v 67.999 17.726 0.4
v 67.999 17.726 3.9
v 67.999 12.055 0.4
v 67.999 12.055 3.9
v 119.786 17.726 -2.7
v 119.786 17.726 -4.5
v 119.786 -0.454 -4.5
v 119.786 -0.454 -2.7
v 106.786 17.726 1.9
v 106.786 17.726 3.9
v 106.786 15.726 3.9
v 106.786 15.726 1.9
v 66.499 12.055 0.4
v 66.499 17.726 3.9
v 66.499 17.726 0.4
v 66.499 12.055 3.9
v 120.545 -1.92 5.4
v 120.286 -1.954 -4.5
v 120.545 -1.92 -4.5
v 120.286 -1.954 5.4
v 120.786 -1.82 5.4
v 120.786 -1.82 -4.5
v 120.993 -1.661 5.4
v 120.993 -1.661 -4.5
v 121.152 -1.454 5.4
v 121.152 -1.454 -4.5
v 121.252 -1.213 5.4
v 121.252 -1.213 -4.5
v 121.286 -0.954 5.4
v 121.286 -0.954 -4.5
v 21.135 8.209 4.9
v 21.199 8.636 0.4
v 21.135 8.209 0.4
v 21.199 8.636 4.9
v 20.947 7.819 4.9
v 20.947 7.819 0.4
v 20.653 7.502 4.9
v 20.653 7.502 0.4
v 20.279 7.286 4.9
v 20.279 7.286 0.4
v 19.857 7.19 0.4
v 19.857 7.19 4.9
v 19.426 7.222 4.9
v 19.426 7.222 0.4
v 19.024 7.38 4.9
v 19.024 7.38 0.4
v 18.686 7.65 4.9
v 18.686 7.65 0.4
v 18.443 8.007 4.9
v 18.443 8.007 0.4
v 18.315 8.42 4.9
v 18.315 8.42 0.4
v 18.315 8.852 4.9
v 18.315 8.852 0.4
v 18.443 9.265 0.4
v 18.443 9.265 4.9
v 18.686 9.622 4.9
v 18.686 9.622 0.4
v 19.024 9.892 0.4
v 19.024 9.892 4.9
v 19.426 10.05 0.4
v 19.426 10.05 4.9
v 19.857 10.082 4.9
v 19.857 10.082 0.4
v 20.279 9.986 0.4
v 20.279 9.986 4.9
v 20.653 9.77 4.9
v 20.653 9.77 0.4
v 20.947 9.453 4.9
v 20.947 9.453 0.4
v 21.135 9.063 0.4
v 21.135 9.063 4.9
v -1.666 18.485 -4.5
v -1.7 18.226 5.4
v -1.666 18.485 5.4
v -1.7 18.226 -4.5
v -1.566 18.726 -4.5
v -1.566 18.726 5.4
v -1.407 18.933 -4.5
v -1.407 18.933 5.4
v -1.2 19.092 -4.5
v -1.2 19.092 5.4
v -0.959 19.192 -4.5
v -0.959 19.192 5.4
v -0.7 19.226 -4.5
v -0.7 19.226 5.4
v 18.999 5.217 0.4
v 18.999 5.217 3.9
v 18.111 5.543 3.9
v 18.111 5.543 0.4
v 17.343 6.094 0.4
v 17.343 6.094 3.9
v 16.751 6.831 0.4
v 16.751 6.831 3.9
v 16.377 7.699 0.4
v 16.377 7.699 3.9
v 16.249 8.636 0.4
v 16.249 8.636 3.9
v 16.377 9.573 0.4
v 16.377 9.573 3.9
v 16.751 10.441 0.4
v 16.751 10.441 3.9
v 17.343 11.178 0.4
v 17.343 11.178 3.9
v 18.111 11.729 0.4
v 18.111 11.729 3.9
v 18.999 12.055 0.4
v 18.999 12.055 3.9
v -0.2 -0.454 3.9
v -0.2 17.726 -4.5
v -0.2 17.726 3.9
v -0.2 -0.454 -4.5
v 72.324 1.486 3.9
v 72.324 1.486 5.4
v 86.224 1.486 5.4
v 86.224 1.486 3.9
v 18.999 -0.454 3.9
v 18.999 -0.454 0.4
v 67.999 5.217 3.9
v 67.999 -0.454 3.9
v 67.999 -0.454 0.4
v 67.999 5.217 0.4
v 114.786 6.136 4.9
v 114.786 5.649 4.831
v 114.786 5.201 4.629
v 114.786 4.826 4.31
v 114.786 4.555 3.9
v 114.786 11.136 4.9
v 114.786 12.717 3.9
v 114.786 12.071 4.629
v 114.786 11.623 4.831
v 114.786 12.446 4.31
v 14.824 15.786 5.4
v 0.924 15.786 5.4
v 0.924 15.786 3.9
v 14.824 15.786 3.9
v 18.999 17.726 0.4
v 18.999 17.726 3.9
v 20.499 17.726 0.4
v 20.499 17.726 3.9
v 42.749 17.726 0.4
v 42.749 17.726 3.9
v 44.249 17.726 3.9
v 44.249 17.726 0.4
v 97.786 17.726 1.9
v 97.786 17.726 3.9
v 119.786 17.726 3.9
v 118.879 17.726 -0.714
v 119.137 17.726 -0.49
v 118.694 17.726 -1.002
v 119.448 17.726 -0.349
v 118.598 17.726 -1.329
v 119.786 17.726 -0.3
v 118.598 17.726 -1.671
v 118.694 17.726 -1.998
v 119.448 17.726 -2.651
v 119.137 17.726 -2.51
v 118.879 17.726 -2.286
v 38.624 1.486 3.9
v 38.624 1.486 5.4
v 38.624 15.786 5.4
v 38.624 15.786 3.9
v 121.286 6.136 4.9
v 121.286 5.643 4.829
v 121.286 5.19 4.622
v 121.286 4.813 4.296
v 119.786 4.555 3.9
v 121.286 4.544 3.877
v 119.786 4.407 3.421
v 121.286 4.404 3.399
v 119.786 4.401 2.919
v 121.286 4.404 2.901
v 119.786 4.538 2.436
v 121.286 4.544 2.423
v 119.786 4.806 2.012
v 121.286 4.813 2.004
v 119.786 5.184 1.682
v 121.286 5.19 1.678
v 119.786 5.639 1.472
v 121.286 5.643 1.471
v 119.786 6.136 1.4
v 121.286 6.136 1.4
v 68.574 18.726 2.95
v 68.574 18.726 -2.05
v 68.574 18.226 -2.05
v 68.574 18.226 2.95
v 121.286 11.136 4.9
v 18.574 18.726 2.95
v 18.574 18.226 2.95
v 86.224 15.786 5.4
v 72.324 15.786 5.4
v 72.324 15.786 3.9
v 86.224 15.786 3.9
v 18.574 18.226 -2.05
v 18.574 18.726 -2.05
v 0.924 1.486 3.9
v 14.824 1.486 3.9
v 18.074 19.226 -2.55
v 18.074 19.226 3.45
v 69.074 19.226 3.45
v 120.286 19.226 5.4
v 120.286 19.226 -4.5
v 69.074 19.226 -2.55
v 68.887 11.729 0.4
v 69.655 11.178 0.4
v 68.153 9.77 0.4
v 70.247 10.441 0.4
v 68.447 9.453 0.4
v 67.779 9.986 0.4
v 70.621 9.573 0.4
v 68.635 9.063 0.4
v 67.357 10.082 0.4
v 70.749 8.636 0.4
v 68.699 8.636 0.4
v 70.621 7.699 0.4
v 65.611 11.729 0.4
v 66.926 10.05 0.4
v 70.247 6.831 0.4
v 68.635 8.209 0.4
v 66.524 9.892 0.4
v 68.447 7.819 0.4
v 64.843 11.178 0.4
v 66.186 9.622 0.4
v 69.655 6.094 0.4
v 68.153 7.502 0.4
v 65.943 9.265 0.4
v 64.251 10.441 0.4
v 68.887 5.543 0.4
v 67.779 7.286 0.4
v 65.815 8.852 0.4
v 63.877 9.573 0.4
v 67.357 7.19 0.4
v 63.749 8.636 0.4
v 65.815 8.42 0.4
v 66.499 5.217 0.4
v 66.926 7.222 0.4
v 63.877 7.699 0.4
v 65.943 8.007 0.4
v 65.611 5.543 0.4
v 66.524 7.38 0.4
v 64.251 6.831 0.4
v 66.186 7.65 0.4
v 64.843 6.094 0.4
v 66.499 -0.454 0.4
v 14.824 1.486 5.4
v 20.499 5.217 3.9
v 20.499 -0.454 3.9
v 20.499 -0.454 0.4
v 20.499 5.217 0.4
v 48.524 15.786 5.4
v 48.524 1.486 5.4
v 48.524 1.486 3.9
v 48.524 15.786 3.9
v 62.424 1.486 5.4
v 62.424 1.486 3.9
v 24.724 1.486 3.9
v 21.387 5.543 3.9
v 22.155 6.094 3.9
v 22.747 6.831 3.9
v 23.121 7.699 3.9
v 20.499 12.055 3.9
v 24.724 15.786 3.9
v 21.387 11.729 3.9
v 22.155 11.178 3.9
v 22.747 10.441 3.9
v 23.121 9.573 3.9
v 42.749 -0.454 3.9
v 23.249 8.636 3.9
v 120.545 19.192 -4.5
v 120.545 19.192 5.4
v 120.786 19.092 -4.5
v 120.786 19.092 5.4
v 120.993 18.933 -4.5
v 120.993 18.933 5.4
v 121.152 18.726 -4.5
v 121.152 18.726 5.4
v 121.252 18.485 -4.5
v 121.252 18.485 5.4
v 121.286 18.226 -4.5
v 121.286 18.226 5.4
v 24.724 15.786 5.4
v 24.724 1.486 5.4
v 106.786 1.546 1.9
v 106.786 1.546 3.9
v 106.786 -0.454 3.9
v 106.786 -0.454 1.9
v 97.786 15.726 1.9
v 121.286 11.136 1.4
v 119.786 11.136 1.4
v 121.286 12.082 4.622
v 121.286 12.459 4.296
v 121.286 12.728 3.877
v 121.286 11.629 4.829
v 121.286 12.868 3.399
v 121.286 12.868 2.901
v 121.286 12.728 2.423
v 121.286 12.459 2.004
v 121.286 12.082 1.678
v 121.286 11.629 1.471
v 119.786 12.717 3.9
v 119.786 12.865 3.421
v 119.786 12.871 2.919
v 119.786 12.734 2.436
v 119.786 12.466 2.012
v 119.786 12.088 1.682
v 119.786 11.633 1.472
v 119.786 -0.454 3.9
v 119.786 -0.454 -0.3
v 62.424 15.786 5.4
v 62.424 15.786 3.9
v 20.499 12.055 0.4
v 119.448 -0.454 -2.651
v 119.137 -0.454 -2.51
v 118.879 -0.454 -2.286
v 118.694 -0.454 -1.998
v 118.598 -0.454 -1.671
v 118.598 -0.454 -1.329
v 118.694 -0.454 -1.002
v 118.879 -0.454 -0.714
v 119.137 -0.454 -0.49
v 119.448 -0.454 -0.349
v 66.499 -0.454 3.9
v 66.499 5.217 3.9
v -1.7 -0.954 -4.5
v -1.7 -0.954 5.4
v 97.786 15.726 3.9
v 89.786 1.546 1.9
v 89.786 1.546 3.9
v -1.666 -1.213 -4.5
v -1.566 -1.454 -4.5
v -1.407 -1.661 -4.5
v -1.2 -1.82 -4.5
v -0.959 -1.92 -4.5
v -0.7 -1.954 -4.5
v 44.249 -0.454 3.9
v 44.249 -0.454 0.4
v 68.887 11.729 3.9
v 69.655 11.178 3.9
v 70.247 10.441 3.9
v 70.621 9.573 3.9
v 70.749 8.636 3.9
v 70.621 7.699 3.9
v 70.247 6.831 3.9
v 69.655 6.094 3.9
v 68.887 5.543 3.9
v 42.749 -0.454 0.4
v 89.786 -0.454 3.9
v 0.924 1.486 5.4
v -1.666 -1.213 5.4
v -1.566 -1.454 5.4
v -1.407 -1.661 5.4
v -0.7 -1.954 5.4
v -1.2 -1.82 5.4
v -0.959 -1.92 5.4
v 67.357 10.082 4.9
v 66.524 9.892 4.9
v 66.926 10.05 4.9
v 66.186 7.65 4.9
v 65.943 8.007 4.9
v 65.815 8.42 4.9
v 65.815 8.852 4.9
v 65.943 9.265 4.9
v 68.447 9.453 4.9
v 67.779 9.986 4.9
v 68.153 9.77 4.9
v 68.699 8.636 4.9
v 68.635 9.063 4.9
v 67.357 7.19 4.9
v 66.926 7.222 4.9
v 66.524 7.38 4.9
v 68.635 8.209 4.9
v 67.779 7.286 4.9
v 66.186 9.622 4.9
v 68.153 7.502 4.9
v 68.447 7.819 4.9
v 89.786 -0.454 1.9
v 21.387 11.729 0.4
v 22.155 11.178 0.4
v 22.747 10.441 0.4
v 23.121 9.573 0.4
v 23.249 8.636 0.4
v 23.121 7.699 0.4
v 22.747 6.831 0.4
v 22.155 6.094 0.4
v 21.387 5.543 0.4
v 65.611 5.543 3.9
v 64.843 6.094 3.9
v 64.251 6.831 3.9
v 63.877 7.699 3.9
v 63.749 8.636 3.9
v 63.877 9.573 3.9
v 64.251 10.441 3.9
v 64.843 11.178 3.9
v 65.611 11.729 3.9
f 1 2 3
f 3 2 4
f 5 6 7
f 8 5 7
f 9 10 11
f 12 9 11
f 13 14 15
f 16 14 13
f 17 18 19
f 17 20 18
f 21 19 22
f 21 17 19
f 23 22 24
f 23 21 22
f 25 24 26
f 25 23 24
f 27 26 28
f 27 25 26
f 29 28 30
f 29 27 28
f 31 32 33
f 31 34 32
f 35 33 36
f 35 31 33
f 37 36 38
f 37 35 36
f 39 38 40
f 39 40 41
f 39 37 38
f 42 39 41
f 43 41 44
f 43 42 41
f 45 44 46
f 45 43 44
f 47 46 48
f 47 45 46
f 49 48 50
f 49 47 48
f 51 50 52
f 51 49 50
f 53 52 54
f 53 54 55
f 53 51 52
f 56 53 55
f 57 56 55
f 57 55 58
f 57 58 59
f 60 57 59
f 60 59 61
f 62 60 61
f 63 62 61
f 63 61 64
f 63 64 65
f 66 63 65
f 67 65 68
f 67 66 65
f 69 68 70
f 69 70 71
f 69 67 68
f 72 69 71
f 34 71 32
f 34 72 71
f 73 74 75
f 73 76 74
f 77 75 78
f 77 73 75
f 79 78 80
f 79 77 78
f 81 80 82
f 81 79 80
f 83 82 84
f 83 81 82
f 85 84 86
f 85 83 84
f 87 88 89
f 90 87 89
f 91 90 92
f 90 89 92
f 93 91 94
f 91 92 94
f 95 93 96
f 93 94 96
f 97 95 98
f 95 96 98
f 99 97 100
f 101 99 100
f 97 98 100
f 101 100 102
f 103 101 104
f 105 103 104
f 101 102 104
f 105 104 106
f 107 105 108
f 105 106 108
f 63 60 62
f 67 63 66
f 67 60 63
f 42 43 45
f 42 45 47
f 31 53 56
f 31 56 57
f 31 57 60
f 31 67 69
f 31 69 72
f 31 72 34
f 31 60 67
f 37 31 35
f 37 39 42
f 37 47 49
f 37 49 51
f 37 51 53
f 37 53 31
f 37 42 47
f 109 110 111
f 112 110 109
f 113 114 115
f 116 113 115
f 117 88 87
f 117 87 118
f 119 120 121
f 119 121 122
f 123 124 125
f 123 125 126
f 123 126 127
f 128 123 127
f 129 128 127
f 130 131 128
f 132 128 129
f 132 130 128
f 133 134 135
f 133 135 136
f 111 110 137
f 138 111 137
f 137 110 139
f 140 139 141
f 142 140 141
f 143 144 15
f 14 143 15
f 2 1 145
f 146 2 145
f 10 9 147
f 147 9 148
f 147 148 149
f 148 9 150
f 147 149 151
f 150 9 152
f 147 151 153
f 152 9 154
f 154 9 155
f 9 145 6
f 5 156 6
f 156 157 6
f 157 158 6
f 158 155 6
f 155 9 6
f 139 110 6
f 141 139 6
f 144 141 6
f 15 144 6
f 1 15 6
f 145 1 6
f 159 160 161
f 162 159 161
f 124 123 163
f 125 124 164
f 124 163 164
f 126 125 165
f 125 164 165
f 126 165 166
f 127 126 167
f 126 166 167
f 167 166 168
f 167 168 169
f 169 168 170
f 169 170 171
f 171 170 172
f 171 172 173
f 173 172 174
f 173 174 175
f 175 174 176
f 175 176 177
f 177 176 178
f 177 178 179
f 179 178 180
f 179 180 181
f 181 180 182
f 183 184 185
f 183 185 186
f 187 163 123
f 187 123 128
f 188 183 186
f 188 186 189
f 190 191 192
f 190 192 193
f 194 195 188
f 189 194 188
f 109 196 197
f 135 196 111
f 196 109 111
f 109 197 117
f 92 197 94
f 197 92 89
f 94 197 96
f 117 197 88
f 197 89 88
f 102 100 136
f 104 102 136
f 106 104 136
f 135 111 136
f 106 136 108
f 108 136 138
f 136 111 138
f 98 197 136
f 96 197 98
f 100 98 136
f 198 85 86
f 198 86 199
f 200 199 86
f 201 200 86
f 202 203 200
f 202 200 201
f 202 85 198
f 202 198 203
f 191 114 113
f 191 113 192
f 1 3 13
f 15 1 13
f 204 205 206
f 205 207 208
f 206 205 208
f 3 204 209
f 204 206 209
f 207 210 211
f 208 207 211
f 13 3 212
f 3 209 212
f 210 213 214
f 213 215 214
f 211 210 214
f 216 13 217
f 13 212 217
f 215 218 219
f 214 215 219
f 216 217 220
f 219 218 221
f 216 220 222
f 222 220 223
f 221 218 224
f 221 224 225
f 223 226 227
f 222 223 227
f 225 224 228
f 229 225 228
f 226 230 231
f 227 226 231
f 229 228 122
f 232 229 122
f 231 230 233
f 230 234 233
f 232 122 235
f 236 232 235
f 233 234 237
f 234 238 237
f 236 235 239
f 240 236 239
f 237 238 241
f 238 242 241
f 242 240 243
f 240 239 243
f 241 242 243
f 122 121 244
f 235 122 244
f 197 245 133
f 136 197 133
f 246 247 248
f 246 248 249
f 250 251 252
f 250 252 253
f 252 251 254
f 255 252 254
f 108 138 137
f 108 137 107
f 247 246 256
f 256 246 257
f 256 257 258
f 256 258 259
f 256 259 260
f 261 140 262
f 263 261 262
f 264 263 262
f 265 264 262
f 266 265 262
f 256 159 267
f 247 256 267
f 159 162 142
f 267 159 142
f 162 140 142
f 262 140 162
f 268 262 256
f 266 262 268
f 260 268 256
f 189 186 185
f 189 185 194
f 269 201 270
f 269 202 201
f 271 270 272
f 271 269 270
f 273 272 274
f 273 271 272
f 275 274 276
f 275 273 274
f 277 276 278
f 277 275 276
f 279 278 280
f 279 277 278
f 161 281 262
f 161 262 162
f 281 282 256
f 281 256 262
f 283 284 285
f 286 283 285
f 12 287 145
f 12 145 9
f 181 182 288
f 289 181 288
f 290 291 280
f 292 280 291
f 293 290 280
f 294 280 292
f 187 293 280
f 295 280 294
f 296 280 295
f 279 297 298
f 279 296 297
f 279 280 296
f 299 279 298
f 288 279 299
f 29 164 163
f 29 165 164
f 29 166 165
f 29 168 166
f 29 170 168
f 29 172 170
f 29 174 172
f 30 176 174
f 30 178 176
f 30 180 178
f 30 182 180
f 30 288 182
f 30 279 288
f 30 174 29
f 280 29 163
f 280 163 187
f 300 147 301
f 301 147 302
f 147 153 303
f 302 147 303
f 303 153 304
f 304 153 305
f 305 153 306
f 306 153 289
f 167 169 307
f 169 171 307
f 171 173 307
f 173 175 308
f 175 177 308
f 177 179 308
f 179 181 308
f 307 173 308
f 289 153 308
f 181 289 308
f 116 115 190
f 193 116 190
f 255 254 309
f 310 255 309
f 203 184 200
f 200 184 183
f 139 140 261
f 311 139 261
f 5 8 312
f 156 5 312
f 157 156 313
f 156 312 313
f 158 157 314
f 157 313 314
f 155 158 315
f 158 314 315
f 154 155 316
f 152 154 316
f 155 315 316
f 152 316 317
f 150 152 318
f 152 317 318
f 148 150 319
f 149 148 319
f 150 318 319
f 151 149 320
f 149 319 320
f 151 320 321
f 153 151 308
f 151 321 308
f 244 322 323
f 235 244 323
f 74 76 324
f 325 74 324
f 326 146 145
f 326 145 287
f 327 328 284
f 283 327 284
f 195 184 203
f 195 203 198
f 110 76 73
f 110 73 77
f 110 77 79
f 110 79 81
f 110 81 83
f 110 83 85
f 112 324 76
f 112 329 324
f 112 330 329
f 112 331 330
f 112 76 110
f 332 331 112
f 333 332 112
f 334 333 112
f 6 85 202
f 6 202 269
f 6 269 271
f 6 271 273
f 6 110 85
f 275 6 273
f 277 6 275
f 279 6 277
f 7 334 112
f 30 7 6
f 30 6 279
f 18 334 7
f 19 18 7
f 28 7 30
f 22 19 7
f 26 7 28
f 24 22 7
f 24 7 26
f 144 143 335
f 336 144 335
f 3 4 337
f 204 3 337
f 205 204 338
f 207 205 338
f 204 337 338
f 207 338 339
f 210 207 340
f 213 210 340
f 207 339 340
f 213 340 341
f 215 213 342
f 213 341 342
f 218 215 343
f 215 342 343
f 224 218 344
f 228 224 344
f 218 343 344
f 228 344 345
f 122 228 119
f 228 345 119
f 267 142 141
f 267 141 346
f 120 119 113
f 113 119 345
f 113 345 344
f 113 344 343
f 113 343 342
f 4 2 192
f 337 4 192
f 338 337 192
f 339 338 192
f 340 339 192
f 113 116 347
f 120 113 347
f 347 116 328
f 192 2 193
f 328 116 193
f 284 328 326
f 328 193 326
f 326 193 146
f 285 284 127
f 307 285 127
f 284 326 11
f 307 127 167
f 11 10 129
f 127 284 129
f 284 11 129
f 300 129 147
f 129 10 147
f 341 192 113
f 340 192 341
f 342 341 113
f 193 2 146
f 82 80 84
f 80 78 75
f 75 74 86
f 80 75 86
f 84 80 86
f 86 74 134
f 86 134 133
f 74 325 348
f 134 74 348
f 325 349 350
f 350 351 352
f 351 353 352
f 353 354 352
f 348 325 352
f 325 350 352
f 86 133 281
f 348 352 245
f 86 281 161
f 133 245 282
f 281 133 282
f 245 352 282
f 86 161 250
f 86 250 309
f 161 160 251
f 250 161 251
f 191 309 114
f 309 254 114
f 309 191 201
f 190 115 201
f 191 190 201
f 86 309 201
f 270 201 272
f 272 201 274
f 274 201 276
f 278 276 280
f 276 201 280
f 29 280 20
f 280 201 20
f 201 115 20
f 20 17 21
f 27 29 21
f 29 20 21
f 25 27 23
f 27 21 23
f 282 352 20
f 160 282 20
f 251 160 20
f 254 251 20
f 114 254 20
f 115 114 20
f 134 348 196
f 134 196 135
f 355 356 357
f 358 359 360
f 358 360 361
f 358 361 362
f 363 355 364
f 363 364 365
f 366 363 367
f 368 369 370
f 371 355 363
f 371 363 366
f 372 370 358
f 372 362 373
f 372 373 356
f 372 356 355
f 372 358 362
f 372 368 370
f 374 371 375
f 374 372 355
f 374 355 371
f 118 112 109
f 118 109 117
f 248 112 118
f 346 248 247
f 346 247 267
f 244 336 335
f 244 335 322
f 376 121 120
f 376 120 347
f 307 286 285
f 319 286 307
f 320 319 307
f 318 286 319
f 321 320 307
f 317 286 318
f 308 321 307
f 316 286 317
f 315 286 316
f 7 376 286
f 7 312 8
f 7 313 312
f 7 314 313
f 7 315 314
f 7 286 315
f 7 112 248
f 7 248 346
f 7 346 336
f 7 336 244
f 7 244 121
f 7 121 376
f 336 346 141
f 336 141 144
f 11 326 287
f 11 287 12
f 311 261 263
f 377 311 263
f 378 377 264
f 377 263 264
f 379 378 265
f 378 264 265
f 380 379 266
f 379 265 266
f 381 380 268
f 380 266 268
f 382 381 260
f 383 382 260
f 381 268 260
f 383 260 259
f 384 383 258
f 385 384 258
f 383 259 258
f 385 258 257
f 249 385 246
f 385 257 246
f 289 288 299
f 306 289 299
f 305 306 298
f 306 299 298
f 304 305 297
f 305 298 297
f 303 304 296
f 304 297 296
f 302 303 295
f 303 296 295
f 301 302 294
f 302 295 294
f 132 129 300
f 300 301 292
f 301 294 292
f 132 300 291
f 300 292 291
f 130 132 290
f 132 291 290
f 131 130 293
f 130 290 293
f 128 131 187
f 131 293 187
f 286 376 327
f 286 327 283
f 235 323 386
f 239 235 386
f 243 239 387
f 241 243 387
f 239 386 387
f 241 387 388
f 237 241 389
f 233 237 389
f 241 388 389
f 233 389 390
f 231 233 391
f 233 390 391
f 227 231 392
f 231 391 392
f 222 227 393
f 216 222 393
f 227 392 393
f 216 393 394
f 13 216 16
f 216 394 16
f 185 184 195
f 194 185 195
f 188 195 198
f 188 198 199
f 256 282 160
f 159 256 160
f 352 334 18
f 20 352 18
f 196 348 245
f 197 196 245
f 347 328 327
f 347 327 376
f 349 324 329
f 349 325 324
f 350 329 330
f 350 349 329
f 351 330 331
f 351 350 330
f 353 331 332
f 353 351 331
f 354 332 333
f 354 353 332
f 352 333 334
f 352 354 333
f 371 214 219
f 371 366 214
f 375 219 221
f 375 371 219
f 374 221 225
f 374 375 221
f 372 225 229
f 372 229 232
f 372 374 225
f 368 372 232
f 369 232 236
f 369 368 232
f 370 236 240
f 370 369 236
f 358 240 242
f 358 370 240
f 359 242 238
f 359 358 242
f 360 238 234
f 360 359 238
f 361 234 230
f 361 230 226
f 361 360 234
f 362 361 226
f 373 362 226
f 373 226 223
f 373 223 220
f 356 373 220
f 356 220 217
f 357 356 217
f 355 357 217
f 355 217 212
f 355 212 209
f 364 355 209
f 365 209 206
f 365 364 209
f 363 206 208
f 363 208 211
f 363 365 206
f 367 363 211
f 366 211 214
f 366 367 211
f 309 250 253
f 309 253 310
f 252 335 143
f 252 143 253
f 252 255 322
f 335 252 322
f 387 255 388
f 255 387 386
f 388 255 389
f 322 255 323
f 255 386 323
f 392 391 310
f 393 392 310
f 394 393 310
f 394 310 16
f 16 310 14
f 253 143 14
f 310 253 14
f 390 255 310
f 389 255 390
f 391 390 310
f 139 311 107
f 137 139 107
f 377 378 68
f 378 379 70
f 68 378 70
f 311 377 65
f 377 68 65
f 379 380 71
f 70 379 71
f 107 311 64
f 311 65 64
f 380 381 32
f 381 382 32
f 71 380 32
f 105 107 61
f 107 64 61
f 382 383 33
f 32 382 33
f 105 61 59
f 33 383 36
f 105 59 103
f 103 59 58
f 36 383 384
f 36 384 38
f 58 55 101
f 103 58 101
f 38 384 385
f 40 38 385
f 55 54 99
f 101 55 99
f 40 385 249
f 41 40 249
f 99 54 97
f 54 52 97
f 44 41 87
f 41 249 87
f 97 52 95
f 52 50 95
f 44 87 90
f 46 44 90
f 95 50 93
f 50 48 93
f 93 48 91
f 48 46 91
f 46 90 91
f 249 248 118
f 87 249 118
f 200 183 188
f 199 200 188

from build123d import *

# Parameters (mm, degrees)
SKETCH005_W     = 122.986
SKETCH005_H     = 21.18
SKETCH005_W_2   = 119.986
SKETCH005_H_2   = 18.18
PAD004_DEPTH    = 9.9
SKETCH006_W     = 122.986
SKETCH006_H     = 21.18
PAD005_DEPTH    = 1.5
SKETCH007_W     = 13.9
SKETCH007_H     = 14.3
POCKET001_DEPTH = 9.901
SKETCH008_R     = 1.45
SKETCH008_W     = 1.5
SKETCH008_H     = 18.18
PAD006_DEPTH    = 3.5
SKETCH009_W     = 9
SKETCH009_H     = 2
SKETCH009_W_2   = 17
PAD007_DEPTH    = 2
POCKET002_DEPTH = 6.5
FILLET_R        = 1
PAD008_DEPTH    = 18.18
SKETCH012_W     = 50
SKETCH012_H     = 5
POCKET003_DEPTH = 1
CHAMFER001_SIZE = 0.5
SKETCH013_R     = 1.45
POCKET004_DEPTH = 1


with BuildPart() as part:
    # Sketch005 (on ShapeBinder) → Pad004 (new body)
    with BuildSketch(Plane(origin=(-93.484762, 101.426, -4.5), x_dir=(1, 0, 0), z_dir=(0, 0, -1))):
        with Locations((153.277762, 92.79)):
            Rectangle(SKETCH005_W, SKETCH005_H)
        with Locations((153.277762, 92.79)):
            Rectangle(SKETCH005_W_2, SKETCH005_H_2, mode=Mode.SUBTRACT)
    extrude(amount=-PAD004_DEPTH)

    # Sketch006 (on Face10 of Pad004) → Pad005 (join)
    with BuildSketch(Plane(origin=(-93.484762, 101.426, 5.4), x_dir=(1, 0, 0), z_dir=(0, 0, 1))):
        with Locations((153.277762, -92.79)):
            Rectangle(SKETCH006_W, SKETCH006_H)
    extrude(amount=-PAD005_DEPTH)

    # Sketch007 (on Face16 of Pad005) → Pocket001 (cut, through all)
    with BuildSketch(Plane(origin=(-93.484762, 101.426, 5.4), x_dir=(1, 0, 0), z_dir=(0, 0, 1))):
        with Locations((101.358762, -92.79)):
            Rectangle(SKETCH007_W, SKETCH007_H)
        with Locations((125.158762, -92.79)):
            Rectangle(SKETCH007_W, SKETCH007_H)
        with Locations((148.958762, -92.79)):
            Rectangle(SKETCH007_W, SKETCH007_H)
        with Locations((172.758762, -92.79)):
            Rectangle(SKETCH007_W, SKETCH007_H)
    extrude(amount=-POCKET001_DEPTH, mode=Mode.SUBTRACT)

    # Sketch008 (on Face15 of Pocket001) → Pad006 (join)
    with BuildSketch(Plane(origin=(-93.484762, 101.426, 3.9), x_dir=(1, 0, 0), z_dir=(0, 0, -1))):
        with BuildLine():
            Line((112.483762, 96.208699), (112.483762, 101.88))
            Line((112.483762, 101.88), (113.983762, 101.88))
            Line((113.983762, 101.88), (113.983762, 96.208699))
            ThreePointArc((113.983762, 89.371301), (116.733762, 92.79), (113.983762, 96.208699))
            Line((113.983762, 83.7), (113.983762, 89.371301))
            Line((112.483762, 83.7), (113.983762, 83.7))
            Line((112.483762, 83.7), (112.483762, 89.371301))
            ThreePointArc((112.483762, 96.208699), (109.733762, 92.79), (112.483762, 89.371301))
        make_face()
        with Locations((113.233762, 92.79)):
            Circle(SKETCH008_R, mode=Mode.SUBTRACT)
        with Locations((136.983762, 92.79)):
            Rectangle(SKETCH008_W, SKETCH008_H)
        with BuildLine():
            Line((159.983762, 101.88), (161.483762, 101.88))
            Line((161.483762, 101.88), (161.483762, 96.208699))
            ThreePointArc((161.483762, 89.371301), (164.233762, 92.79), (161.483762, 96.208699))
            Line((161.483762, 83.7), (161.483762, 89.371301))
            Line((159.983762, 83.7), (161.483762, 83.7))
            Line((159.983762, 83.7), (159.983762, 89.371301))
            ThreePointArc((159.983762, 96.208699), (157.233762, 92.79), (159.983762, 89.371301))
            Line((159.983762, 101.88), (159.983762, 96.208699))
        make_face()
        with Locations((160.733762, 92.79)):
            Circle(SKETCH008_R, mode=Mode.SUBTRACT)
    extrude(amount=PAD006_DEPTH)

    # Sketch009 (on Face27 of Pad006) → Pad007 (join)
    with BuildSketch(Plane(origin=(-93.484762, 101.426, 3.9), x_dir=(1, 0, 0), z_dir=(0, 0, -1))):
        with Locations((195.770762, 84.7)):
            Rectangle(SKETCH009_W, SKETCH009_H)
        with Locations((191.770762, 100.88)):
            Rectangle(SKETCH009_W_2, SKETCH009_H)
    extrude(amount=PAD007_DEPTH)

    # Sketch010 (on Face5 of Pad007) → Pocket002 (cut)
    with BuildSketch(Plane(origin=(121.286, 101.426, -1.6), x_dir=(0, 1, 0), z_dir=(1, 0, 0))):
        with BuildLine():
            ThreePointArc((-95.29, 6.5), (-97.04, 4.75), (-95.29, 3))
            Line((-95.29, 3), (-90.29, 3))
            ThreePointArc((-90.29, 3), (-88.54, 4.75), (-90.29, 6.5))
            Line((-95.29, 6.5), (-90.29, 6.5))
        make_face()
    extrude(amount=-POCKET002_DEPTH, mode=Mode.SUBTRACT)

    # Fillet
    fillet_edges = [part.edges().sort_by_distance(p)[0] for p in [
        (121.286, 19.226, -0.3),
        (121.286, -1.954, -0.3),
        (-1.7, 19.226, -0.3),
        (-1.7, -1.954, -0.3),
    ]]
    fillet(fillet_edges, radius=FILLET_R)

    # Sketch011 (on Face14 of Fillet) → Pad008 (join)
    with BuildSketch(Plane(origin=(-93.484762, -0.454, -1.6), x_dir=(-1, 0, 0), z_dir=(0, 1, 0))):
        with BuildLine():
            ThreePointArc((-213.270762, -1.1), (-212.070762, 0.1), (-213.270762, 1.3))
            Line((-213.270762, 1.3), (-213.270762, -1.1))
        make_face()
    extrude(amount=PAD008_DEPTH)

    # Sketch012 (on Face1 of Pad008) → Pocket003 (cut)
    with BuildSketch(Plane(origin=(-93.484762, 19.226, -1.6), x_dir=(-1, 0, 0), z_dir=(0, 1, 0))):
        with Locations((-137.058762, 2.05)):
            Rectangle(SKETCH012_W, SKETCH012_H)
    extrude(amount=-POCKET003_DEPTH, mode=Mode.SUBTRACT)

    # Chamfer001
    chamfer001_edges = [part.edges().sort_by_distance(p)[0] for p in [
        (43.574, 19.226, -2.05),
        (68.574, 19.226, 0.45),
        (43.574, 19.226, 2.95),
        (18.574, 19.226, 0.45),
    ]]
    chamfer(chamfer001_edges, length=CHAMFER001_SIZE)

    # Sketch013 (on Face87 of Chamfer001) → Pocket004 (cut)
    with BuildSketch(Plane(origin=(-93.484762, 101.426, 3.9), x_dir=(1, 0, 0), z_dir=(0, 0, -1))):
        with Locations((113.233762, 92.79)):
            Circle(SKETCH013_R)
        with Locations((160.733762, 92.79)):
            Circle(SKETCH013_R)
    extrude(amount=-POCKET004_DEPTH, mode=Mode.SUBTRACT)


solid = part.part
